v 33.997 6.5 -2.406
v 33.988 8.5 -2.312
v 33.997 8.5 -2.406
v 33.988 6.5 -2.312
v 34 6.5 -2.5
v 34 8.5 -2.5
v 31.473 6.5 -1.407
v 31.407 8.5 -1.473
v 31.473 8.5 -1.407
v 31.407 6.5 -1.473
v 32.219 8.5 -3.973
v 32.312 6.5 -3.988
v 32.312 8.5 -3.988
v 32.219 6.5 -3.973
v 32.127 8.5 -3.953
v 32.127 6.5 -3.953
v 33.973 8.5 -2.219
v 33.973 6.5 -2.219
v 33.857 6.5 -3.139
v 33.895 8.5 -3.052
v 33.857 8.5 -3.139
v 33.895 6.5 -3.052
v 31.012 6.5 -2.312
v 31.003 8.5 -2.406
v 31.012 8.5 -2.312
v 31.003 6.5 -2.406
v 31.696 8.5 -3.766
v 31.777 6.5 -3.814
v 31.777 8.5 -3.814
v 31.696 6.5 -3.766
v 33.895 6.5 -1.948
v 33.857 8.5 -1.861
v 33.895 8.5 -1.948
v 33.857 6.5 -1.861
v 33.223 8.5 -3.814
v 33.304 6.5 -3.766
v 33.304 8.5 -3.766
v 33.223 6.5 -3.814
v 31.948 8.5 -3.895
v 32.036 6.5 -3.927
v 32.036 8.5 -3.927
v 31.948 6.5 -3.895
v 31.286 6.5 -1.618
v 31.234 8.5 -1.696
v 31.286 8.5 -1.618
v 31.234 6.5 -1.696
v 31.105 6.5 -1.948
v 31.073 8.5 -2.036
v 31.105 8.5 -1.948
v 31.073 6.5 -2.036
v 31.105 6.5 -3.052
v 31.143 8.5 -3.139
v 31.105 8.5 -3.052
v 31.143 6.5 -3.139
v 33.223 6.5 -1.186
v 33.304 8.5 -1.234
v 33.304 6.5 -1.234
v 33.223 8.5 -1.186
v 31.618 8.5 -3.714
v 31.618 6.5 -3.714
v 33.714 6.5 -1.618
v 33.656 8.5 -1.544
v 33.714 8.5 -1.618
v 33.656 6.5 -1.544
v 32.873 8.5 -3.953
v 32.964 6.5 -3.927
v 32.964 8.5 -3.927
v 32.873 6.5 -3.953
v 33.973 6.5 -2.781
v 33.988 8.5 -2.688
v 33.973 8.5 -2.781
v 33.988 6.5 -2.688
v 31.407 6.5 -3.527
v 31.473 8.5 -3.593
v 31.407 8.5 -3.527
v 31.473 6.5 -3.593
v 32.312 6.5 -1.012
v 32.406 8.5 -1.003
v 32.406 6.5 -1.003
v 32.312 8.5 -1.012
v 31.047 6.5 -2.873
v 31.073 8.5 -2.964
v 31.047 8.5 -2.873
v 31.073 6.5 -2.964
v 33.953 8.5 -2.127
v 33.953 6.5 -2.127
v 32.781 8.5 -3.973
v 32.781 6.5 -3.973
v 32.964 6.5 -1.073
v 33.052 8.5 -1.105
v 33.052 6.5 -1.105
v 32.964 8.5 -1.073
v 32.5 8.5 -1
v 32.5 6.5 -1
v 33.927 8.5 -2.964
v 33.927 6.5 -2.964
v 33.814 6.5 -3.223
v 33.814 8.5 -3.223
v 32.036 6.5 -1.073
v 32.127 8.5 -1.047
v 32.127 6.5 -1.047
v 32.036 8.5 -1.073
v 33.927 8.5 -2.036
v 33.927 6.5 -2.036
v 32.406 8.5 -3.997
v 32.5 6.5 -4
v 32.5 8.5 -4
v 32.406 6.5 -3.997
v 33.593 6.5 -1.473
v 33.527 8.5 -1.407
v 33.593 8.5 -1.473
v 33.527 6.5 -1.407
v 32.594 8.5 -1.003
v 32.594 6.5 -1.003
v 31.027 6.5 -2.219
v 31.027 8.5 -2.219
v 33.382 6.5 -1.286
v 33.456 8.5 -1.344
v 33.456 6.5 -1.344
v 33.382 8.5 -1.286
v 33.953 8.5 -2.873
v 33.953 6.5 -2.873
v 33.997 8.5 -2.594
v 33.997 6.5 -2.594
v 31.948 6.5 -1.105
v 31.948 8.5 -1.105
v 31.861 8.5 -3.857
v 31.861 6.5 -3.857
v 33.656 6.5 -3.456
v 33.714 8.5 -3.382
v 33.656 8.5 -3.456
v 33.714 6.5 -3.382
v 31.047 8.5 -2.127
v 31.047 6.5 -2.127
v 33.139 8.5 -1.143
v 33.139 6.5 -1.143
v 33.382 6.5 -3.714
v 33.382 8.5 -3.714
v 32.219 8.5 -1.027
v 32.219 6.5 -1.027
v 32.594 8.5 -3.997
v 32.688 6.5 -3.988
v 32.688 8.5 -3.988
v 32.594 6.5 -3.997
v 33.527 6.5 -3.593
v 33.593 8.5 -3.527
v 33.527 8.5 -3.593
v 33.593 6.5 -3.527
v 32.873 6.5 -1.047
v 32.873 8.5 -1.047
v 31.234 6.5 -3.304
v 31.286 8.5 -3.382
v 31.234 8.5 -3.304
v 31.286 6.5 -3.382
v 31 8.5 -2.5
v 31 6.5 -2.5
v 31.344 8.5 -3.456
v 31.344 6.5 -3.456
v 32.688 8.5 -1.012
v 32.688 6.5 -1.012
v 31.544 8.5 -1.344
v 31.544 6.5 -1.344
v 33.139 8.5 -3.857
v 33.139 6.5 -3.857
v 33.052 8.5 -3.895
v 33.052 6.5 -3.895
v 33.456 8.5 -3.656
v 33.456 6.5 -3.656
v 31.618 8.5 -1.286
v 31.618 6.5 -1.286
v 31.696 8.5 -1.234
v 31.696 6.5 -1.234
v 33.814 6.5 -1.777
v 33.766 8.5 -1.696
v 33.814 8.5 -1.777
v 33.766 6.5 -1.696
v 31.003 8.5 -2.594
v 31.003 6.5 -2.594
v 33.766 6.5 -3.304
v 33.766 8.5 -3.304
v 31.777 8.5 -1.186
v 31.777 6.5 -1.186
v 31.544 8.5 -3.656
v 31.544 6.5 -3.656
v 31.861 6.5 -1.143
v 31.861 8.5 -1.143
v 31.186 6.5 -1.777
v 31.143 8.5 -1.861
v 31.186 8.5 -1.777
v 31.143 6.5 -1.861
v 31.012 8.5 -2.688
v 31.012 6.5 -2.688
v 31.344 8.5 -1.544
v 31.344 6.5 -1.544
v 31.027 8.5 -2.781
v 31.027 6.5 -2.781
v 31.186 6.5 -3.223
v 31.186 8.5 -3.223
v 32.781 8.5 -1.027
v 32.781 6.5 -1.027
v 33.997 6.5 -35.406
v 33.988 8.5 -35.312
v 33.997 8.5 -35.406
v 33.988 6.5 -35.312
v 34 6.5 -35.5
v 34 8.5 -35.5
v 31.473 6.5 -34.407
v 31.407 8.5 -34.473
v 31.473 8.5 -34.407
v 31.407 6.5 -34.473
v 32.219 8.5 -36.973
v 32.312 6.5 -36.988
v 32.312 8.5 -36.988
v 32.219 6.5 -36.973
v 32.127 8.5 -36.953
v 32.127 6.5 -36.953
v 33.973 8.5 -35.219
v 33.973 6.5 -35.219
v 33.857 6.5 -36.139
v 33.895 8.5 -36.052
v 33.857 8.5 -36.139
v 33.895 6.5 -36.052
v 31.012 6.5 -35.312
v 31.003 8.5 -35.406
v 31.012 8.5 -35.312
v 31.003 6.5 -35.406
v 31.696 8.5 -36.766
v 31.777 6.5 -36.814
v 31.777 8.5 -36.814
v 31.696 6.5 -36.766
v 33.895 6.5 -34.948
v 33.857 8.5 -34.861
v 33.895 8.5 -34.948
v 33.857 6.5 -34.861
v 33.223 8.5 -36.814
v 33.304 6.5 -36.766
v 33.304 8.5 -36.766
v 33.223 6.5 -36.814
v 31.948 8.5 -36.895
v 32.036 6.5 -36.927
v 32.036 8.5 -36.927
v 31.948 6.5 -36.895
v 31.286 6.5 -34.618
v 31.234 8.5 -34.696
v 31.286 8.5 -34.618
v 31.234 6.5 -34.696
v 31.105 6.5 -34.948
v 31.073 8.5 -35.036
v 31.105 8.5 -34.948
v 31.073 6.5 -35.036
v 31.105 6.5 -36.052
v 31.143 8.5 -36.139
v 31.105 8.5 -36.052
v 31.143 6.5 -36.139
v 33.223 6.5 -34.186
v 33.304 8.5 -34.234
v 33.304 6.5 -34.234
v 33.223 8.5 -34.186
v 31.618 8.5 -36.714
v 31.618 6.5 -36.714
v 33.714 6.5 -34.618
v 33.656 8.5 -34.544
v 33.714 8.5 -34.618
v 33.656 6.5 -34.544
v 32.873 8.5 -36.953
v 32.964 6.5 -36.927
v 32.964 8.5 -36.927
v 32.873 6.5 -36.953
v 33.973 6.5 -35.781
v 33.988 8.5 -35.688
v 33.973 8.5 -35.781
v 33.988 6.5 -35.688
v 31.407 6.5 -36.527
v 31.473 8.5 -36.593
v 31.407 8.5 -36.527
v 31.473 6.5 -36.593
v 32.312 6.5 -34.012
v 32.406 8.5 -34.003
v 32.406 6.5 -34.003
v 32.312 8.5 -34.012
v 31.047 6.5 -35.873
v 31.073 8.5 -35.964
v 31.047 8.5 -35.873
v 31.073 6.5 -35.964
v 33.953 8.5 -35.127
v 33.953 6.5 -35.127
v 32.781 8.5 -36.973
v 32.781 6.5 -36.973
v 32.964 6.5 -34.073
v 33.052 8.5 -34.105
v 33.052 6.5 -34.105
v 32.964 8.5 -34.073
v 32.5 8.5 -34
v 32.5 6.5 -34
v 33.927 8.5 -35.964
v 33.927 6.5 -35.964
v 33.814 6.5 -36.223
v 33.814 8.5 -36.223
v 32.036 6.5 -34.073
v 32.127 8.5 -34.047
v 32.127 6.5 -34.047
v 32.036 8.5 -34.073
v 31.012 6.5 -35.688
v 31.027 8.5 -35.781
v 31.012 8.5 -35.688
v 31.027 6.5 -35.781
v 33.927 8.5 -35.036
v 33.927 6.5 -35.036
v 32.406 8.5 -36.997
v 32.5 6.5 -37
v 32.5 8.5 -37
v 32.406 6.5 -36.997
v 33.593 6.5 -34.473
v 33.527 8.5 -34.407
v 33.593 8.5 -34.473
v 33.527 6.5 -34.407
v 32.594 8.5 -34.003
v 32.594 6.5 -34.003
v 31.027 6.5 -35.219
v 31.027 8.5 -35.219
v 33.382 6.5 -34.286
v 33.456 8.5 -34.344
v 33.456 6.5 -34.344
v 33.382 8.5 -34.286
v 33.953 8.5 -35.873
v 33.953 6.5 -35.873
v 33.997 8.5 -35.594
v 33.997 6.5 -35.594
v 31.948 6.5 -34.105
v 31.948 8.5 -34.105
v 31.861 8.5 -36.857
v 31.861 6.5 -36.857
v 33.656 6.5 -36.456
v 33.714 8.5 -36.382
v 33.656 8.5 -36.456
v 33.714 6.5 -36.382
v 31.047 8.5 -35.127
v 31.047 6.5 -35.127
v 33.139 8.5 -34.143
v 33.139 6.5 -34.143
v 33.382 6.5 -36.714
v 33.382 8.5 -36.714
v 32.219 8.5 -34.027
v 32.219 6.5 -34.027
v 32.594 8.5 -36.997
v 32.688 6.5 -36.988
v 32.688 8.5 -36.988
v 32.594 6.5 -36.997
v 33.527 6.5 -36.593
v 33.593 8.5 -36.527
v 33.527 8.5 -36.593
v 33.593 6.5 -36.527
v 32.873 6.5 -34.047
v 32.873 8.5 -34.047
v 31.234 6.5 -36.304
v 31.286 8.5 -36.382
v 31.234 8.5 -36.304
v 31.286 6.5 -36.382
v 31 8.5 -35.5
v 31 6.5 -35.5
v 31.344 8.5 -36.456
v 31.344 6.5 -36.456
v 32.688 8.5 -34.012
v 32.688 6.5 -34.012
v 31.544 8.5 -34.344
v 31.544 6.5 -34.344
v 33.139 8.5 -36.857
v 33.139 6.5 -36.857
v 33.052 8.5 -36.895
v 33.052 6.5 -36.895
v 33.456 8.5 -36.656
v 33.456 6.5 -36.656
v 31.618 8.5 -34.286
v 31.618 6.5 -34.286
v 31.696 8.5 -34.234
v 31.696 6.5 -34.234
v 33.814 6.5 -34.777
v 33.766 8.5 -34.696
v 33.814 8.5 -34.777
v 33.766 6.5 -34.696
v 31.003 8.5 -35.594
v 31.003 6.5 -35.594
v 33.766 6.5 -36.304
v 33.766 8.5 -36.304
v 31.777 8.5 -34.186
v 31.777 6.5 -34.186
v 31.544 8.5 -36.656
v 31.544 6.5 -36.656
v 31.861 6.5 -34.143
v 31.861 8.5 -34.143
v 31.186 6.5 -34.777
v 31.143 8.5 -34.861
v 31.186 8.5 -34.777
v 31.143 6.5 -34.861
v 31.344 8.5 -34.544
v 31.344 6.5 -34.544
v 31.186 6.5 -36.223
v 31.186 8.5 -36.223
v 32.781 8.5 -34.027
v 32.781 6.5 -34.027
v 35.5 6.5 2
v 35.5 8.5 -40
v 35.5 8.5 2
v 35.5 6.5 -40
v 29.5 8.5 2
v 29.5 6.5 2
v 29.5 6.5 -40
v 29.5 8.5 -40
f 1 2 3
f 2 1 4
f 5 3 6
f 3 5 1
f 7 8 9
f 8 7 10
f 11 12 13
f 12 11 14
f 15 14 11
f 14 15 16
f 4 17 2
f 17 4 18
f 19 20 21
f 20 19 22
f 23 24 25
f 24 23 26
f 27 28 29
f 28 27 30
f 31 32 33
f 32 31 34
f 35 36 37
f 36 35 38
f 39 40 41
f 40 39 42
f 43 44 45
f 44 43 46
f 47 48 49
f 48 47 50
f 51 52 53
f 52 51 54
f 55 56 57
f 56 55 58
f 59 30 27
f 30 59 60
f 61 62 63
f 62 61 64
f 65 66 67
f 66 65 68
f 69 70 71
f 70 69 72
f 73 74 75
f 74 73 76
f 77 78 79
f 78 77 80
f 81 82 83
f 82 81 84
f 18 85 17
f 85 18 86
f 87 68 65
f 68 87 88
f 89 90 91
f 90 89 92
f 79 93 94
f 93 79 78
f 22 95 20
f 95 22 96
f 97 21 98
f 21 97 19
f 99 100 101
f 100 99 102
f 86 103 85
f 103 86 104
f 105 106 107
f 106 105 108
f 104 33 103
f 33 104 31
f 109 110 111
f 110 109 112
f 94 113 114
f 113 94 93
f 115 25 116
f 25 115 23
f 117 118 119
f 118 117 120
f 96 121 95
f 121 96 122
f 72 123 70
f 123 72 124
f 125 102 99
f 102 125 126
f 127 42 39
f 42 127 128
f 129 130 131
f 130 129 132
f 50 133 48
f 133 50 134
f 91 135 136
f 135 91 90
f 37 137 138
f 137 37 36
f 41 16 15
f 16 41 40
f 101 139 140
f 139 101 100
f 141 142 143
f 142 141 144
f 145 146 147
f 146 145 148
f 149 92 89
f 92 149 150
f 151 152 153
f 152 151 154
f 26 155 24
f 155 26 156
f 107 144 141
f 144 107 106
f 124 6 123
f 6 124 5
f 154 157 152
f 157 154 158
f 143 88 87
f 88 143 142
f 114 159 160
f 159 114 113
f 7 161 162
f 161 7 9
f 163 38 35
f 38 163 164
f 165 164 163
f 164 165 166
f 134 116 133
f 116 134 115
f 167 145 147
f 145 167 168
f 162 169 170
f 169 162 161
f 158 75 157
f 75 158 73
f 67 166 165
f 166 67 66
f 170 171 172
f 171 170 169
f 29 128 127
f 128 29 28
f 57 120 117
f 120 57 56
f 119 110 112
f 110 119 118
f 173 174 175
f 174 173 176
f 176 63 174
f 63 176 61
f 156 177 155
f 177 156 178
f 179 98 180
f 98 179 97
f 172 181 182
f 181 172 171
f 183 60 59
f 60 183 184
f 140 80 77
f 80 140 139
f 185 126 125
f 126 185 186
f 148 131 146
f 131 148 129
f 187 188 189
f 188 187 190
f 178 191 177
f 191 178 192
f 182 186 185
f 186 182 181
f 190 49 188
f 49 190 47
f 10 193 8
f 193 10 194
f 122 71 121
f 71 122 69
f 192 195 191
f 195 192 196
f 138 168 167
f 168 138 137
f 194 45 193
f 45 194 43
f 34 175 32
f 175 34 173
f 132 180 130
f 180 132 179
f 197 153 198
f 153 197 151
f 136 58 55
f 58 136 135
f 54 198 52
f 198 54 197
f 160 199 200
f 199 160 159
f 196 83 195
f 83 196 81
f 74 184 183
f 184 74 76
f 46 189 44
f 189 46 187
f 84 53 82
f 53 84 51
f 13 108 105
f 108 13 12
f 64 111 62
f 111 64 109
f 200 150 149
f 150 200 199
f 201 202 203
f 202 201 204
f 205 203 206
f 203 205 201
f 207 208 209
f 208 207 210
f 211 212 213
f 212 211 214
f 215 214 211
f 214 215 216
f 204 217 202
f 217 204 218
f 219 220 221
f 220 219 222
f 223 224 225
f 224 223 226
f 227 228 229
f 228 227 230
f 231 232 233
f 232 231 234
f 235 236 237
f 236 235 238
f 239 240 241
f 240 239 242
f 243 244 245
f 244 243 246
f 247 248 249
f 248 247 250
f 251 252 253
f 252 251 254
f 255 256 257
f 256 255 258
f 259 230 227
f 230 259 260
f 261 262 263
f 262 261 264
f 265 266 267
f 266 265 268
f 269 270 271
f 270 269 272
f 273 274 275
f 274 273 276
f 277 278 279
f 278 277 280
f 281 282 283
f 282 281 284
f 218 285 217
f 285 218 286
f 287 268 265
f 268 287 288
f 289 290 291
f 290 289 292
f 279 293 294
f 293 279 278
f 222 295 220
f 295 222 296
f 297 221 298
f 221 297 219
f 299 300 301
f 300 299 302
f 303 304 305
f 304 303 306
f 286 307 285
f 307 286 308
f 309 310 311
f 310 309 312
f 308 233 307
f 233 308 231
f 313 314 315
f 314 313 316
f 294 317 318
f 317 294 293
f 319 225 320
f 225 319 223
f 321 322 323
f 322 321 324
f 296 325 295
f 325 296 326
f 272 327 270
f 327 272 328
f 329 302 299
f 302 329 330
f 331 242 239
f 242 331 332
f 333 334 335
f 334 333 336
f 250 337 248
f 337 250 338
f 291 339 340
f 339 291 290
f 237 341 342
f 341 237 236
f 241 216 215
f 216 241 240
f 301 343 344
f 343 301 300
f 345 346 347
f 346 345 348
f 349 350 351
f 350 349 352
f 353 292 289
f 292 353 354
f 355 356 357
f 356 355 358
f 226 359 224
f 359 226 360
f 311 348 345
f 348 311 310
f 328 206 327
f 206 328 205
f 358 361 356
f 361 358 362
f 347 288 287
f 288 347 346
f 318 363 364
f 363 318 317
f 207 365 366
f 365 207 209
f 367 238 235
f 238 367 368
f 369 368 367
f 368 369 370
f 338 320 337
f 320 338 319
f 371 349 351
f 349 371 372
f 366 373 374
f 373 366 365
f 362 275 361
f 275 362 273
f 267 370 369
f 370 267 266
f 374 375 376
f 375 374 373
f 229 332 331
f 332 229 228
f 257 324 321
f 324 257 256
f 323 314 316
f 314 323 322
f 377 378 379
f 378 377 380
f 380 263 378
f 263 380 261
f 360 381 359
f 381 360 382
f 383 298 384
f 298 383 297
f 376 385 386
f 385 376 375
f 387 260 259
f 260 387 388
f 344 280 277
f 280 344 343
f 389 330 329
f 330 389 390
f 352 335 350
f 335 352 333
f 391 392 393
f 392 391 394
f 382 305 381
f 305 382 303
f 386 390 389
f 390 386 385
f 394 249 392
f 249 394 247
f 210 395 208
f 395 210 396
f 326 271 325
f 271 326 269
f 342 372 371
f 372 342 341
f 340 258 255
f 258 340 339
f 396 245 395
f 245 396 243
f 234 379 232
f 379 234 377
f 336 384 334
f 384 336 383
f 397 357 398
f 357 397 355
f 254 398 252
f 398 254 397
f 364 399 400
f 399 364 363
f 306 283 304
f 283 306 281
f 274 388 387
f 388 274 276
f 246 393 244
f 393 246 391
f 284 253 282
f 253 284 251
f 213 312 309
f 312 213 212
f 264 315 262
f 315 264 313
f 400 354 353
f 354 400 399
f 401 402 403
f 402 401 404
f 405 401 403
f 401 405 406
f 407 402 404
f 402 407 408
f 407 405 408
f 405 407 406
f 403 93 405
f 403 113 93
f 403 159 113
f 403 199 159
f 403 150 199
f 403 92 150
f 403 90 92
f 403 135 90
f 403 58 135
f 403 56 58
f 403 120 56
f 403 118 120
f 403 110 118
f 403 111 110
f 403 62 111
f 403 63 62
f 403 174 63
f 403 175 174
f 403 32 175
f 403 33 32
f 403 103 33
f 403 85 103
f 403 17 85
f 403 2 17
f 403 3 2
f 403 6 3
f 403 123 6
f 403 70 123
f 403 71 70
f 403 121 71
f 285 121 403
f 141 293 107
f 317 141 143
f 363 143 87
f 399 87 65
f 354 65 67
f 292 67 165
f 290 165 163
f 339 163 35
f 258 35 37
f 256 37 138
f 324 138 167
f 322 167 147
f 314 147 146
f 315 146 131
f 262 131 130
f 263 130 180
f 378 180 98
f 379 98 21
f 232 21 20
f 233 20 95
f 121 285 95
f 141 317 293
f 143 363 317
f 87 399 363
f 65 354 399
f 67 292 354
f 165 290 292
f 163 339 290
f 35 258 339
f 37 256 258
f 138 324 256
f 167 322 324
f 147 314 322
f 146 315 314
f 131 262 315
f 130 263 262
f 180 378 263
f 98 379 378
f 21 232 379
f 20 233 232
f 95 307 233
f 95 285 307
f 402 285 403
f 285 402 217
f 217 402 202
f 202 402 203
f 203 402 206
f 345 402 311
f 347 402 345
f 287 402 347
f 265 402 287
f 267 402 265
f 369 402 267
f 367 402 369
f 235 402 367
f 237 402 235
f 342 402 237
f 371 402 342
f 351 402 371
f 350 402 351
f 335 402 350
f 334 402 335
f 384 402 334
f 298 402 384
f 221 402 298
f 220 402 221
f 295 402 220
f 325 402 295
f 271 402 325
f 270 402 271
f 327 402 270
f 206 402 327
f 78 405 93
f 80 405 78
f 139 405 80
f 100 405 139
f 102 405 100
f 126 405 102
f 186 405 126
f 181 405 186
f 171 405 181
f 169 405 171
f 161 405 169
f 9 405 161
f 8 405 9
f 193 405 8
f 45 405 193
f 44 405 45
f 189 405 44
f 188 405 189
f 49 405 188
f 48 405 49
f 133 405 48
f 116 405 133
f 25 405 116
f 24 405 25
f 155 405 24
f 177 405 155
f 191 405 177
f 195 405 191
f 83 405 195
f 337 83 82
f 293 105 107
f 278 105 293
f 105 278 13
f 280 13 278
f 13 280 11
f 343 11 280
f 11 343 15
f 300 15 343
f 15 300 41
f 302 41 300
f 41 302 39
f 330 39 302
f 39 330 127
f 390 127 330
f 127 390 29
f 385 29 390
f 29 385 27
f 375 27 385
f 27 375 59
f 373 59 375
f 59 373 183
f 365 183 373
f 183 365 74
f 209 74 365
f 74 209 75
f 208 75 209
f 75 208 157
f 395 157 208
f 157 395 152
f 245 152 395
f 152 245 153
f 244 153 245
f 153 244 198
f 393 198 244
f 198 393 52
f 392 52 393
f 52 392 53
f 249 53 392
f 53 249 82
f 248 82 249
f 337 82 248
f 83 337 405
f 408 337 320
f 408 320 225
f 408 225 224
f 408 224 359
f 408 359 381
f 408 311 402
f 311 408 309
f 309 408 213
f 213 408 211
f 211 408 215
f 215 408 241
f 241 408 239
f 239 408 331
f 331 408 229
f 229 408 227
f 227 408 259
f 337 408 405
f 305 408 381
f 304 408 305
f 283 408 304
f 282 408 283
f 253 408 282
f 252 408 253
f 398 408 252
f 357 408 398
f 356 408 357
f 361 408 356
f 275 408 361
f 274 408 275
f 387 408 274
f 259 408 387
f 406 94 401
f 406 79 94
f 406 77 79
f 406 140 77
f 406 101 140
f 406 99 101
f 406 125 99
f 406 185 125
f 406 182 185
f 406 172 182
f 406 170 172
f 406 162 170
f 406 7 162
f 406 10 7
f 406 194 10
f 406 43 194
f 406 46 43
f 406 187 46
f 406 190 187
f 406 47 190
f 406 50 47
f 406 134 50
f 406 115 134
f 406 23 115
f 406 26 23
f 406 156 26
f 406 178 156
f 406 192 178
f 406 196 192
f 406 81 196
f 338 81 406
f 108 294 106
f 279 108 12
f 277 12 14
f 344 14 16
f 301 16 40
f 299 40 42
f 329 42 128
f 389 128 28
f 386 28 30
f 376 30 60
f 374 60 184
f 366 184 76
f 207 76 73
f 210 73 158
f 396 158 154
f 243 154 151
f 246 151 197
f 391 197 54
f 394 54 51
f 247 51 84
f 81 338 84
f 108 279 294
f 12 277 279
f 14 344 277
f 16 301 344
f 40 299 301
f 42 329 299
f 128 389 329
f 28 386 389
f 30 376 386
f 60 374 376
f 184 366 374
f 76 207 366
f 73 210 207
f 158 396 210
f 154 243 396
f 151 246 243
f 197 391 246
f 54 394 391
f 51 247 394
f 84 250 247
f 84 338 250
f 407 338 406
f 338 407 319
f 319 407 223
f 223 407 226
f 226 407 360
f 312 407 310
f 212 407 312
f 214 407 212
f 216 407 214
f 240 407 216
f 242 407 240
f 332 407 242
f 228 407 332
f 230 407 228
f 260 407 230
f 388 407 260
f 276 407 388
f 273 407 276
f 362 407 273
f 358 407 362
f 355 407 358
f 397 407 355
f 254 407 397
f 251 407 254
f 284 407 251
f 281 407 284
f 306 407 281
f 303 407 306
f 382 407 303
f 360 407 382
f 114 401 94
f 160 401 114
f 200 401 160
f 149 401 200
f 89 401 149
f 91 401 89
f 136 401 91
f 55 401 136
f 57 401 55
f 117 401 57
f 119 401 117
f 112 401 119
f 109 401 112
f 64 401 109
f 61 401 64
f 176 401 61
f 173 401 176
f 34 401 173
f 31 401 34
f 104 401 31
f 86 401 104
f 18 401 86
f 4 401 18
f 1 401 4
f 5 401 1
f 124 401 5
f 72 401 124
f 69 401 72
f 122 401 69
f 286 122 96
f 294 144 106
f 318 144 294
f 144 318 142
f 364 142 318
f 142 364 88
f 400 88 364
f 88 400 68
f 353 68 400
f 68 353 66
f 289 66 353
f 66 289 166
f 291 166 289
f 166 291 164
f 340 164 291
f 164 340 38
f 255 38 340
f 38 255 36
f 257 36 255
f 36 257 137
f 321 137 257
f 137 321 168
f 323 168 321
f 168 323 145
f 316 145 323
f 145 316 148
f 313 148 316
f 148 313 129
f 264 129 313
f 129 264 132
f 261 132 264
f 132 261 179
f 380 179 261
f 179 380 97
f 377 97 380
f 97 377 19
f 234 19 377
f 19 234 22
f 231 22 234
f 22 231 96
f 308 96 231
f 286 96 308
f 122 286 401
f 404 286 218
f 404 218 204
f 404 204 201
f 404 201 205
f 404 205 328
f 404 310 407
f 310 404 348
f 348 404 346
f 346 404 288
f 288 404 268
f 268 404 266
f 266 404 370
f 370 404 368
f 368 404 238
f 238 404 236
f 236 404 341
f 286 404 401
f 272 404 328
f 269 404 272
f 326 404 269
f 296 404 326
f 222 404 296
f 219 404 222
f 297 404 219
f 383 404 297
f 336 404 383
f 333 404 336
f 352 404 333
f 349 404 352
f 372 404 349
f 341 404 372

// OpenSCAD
difference(){
	union(){
        translate([29.5,6.5,-40]){
           cube([6,2,42], center=false);
        }   

    }
    union() {
        translate([32.5,15,-2.5]){
            rotate([90,0,0]){
                cylinder(h=28, r=1.5, $fn=100, center=false);
            }
        }
        translate([32.5,15,-35.5]){
            rotate([90,0,0]){
                cylinder(h=28, r=1.5, $fn=100, center=false);
            }
        }        
    }


}
